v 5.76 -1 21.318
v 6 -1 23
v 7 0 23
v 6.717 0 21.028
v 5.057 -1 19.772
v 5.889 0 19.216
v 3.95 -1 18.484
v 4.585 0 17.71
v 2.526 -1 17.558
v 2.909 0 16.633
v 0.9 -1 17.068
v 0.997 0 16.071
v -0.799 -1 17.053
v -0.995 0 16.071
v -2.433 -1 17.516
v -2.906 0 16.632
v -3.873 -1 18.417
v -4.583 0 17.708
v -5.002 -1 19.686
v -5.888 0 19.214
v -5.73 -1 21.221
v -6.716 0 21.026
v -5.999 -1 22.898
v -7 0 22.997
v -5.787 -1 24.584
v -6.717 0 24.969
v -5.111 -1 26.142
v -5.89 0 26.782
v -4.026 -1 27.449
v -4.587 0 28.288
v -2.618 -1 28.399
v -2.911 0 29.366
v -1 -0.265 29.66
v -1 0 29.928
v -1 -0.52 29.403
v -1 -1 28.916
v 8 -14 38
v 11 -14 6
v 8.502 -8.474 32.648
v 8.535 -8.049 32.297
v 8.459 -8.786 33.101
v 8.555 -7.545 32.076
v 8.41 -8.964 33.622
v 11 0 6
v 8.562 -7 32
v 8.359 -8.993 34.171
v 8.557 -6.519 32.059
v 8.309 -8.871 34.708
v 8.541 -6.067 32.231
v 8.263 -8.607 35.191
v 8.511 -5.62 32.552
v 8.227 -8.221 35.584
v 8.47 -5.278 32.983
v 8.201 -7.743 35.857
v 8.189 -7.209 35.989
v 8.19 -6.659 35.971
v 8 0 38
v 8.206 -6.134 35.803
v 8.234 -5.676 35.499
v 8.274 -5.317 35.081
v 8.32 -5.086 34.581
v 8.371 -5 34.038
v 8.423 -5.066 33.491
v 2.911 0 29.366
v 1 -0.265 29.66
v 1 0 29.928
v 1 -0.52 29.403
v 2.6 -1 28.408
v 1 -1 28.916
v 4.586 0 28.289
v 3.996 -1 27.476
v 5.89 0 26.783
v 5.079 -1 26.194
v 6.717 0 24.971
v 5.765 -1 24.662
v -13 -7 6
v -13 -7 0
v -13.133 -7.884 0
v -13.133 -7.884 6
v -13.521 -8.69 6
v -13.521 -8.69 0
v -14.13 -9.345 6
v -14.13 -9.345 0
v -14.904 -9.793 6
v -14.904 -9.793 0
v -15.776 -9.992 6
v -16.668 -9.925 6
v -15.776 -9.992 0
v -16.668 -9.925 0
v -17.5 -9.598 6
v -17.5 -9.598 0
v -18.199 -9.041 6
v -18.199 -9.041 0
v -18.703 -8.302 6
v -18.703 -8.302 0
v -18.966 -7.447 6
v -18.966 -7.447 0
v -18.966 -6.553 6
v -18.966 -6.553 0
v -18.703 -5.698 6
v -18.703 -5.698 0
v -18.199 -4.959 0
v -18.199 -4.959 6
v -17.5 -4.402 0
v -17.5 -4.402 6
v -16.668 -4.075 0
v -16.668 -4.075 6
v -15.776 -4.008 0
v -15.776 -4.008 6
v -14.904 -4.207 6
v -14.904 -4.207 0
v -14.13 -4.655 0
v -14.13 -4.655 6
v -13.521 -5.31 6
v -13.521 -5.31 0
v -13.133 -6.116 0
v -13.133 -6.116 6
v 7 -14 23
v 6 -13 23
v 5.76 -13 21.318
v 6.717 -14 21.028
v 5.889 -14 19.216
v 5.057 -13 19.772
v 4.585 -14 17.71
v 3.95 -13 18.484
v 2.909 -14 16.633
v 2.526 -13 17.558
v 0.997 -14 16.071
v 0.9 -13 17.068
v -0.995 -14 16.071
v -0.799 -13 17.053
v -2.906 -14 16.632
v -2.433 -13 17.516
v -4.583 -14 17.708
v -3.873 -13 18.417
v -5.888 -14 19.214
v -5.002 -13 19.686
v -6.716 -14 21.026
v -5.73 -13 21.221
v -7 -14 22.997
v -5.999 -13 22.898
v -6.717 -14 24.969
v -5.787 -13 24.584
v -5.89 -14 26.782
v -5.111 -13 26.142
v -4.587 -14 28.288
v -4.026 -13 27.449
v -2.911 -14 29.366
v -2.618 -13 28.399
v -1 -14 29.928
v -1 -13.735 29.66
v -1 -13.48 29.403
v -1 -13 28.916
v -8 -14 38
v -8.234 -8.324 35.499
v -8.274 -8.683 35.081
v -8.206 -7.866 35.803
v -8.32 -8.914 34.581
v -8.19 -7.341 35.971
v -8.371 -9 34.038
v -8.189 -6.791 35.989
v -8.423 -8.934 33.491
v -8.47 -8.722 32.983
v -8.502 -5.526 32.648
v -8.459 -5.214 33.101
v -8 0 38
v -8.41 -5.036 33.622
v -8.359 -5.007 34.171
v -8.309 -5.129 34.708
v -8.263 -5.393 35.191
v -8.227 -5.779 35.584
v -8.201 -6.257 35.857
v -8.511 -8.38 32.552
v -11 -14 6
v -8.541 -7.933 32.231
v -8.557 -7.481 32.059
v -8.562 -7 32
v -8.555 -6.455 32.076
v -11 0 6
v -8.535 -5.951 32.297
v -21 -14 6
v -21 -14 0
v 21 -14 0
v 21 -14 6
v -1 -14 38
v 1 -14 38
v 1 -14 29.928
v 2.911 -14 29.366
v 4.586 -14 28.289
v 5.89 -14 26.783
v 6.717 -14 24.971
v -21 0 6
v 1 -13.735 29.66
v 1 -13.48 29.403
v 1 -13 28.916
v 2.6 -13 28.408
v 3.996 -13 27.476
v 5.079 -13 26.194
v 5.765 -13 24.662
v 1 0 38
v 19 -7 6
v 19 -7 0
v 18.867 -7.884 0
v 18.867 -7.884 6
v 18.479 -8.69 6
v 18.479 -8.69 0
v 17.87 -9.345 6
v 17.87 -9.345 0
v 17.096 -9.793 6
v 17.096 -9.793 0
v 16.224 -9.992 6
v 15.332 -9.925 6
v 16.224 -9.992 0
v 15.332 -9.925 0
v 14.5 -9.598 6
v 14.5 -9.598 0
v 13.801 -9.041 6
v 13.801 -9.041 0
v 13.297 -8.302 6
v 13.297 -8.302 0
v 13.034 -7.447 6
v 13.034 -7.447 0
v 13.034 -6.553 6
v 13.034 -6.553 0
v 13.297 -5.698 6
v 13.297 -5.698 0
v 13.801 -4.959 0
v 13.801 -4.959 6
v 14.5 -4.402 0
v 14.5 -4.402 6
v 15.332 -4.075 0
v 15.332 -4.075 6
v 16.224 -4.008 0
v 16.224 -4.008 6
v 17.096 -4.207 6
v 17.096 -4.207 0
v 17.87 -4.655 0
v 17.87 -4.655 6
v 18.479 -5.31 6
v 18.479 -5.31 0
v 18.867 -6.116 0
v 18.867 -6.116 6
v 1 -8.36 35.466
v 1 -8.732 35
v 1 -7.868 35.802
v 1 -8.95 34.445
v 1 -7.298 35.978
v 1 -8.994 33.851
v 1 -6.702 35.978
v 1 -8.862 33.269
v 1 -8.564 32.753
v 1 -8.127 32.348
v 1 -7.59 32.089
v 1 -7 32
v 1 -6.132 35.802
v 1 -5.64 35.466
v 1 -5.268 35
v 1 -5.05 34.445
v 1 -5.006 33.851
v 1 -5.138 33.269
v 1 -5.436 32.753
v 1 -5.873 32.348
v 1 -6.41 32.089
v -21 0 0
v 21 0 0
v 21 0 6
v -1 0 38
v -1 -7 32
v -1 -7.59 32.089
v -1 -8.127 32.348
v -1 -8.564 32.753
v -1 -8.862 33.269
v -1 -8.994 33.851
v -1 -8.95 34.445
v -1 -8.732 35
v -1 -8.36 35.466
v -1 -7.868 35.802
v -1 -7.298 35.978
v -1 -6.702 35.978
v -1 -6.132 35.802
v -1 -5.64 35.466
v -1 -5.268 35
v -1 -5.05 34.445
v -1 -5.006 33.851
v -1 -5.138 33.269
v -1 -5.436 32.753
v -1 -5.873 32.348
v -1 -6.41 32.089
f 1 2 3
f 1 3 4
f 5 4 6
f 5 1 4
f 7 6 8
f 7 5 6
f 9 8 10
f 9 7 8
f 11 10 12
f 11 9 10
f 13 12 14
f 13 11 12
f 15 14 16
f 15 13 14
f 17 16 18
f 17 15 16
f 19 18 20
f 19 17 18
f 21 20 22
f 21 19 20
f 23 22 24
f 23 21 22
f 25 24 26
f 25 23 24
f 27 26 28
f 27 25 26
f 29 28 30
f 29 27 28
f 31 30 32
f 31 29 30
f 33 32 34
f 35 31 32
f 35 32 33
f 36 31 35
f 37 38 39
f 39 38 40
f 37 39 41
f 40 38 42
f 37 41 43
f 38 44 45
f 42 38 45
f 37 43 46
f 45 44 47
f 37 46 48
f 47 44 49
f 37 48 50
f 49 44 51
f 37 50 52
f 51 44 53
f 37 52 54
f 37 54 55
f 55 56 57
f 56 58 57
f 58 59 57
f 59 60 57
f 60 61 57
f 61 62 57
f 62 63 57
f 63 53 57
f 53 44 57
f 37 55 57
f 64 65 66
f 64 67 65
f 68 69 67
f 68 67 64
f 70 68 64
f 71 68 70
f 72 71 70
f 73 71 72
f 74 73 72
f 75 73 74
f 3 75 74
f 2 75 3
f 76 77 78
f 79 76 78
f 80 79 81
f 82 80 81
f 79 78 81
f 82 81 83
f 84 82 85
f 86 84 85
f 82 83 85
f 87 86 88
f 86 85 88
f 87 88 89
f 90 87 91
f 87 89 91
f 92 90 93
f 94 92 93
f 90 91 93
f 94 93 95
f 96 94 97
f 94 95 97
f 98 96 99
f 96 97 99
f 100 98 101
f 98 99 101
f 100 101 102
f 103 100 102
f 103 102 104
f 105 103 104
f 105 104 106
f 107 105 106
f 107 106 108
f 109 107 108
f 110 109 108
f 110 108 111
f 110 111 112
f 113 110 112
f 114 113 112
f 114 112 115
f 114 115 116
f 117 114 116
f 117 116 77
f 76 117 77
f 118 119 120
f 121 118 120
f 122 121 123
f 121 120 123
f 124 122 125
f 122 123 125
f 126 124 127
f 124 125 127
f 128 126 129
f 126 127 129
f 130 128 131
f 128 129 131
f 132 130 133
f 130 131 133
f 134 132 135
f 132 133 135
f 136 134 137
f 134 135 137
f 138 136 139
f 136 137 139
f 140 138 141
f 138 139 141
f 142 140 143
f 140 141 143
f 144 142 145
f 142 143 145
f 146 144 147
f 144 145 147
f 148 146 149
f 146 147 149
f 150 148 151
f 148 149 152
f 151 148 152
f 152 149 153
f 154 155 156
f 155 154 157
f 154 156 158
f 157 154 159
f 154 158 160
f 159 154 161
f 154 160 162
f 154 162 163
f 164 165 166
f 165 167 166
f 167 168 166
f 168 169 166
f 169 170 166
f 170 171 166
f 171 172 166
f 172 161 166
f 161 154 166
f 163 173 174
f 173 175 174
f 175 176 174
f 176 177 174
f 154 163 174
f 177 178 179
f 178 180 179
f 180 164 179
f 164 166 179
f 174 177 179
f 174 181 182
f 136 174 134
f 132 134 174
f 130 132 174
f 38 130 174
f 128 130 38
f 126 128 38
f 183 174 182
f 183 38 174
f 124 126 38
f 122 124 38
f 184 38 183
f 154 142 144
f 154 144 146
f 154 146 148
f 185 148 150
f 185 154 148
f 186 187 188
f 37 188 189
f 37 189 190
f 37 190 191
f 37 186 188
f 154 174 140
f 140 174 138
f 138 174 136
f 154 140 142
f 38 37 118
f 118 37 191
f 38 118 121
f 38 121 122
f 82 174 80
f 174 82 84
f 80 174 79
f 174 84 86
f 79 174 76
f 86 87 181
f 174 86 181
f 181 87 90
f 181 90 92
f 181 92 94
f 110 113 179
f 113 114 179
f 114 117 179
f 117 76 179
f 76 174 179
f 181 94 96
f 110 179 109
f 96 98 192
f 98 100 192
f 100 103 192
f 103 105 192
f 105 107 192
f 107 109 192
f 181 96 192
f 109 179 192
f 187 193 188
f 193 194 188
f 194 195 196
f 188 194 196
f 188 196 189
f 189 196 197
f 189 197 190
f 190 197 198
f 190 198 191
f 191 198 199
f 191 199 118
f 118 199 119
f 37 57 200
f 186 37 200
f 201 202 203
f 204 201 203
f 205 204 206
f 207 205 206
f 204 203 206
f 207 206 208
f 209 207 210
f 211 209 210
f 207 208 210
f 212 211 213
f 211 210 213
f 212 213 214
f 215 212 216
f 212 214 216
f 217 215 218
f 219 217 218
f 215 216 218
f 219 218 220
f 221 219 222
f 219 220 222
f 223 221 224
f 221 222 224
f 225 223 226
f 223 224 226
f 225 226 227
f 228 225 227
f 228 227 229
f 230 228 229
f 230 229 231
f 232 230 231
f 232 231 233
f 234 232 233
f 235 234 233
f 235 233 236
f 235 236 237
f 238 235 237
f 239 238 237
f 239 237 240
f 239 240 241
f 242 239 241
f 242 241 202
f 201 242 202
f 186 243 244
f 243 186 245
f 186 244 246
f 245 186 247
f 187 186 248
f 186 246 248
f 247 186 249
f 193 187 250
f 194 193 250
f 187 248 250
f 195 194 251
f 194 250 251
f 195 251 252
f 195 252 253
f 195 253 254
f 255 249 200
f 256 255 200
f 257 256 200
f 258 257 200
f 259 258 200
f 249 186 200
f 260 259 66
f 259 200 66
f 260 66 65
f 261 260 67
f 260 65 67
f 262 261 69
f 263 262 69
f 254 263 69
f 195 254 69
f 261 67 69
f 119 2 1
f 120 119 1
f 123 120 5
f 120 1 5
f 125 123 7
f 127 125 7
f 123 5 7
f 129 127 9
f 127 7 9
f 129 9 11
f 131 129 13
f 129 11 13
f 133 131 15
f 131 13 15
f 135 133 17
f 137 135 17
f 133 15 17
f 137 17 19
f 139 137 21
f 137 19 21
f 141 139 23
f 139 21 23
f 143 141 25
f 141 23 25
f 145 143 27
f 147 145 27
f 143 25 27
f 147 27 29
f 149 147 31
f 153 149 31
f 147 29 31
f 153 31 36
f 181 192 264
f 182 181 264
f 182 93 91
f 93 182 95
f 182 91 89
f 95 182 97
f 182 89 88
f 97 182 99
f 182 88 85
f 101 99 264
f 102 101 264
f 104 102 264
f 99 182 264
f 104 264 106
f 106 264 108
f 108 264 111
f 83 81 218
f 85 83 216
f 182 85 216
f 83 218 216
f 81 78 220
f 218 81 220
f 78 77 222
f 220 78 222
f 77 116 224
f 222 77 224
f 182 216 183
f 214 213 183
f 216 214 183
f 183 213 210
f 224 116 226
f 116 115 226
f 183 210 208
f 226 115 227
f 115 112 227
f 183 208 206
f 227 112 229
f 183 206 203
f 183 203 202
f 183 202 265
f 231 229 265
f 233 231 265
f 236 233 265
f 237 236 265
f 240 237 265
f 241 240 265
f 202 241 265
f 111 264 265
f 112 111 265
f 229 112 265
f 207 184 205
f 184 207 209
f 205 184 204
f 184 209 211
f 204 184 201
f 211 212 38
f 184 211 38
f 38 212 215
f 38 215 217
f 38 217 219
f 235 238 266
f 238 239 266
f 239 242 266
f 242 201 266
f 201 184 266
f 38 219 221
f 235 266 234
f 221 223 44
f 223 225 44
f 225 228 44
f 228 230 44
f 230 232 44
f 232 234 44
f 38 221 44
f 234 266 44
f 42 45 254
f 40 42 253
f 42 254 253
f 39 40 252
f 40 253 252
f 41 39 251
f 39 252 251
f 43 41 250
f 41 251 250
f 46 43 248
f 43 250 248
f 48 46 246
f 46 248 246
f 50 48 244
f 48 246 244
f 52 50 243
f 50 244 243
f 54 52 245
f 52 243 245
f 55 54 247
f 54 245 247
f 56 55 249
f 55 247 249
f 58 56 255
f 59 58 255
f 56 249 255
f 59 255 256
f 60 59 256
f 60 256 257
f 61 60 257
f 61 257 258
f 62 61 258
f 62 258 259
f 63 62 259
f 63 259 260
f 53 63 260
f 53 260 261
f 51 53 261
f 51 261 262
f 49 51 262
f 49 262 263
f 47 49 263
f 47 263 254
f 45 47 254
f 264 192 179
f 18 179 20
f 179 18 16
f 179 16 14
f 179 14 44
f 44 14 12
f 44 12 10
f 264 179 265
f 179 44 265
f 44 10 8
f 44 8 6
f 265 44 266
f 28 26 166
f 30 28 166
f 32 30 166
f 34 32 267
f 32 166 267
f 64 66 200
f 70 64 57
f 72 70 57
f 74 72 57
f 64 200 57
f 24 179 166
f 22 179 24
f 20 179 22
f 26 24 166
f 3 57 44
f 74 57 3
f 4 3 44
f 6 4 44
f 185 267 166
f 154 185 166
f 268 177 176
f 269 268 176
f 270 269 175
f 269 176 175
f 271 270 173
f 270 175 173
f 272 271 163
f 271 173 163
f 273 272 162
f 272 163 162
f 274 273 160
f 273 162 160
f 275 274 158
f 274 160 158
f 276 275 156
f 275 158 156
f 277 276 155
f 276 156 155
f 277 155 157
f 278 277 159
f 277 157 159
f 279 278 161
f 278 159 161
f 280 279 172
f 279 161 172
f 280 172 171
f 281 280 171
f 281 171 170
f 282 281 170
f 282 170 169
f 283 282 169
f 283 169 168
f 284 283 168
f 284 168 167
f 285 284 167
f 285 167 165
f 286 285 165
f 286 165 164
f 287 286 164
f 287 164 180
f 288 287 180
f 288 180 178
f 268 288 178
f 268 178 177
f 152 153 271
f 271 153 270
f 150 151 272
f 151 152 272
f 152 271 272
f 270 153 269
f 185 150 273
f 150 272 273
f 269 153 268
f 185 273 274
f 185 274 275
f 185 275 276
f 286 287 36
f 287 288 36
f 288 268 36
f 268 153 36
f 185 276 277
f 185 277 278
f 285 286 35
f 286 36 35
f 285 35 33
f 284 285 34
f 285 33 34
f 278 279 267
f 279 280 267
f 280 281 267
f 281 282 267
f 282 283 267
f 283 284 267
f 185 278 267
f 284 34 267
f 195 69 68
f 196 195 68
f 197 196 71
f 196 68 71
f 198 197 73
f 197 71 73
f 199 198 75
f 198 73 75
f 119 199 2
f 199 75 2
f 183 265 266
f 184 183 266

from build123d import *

# Parameters (mm, degrees)
F1_DEPTH = 14
F2_R     = 3
F3_DEPTH = 38.001
F4_SIZE  = 1
F5_R     = 2
F6_DEPTH = 42.001
F7_ANGLE = 90


with BuildPart() as f1:
    # F0 (on Top) → F1 (new body)
    with BuildSketch(Plane.XY):
        with BuildLine():
            Line((-21, 6), (-21, 0))
            Line((-21, 0), (21, 0))
            Line((21, 0), (21, 6))
            Line((21, 6), (11, 6))
            Line((11, 6), (8, 38))
            Line((8, 38), (1, 38))
            Line((1, 38), (1, 28.91608))
            ThreePointArc((1, 28.91608), (4.582576, 26.872983), (6, 23))
            ThreePointArc((6, 23), (-3.872983, 18.417424), (-1, 28.91608))
            Line((-1, 28.91608), (-1, 38))
            Line((-1, 38), (-8, 38))
            Line((-8, 38), (-11, 6))
            Line((-11, 6), (-21, 6))
        make_face()
    extrude(amount=F1_DEPTH)

    # F2 (on face) → F3 (cut, through all)
    with BuildSketch(Plane.XZ):
        with Locations((-16, 7)):
            Circle(F2_R)
        with Locations((16, 7)):
            Circle(F2_R)
    extrude(amount=-F3_DEPTH, mode=Mode.SUBTRACT)

    # F4
    f4_edges = [f1.edges().sort_by_distance(p)[0] for p in [
        (0, 17, 14),
        (0, 17, 0),
    ]]
    chamfer(f4_edges, length=F4_SIZE)

    # F5 (on face) → F6 (cut, through all)
    with BuildSketch(Plane(origin=(-21, 0, 0), x_dir=(0, -1, 0), z_dir=(-1, 0, 0))):
        with Locations((-34, 7)):
            Circle(F5_R)
    extrude(amount=-F6_DEPTH, mode=Mode.SUBTRACT)


with BuildPart() as f1_1:
    # F7: moved
    add(f1.part.rotate(Axis((0, 0, 0), (1, 0, 0)), F7_ANGLE))


solid = f1_1.part
